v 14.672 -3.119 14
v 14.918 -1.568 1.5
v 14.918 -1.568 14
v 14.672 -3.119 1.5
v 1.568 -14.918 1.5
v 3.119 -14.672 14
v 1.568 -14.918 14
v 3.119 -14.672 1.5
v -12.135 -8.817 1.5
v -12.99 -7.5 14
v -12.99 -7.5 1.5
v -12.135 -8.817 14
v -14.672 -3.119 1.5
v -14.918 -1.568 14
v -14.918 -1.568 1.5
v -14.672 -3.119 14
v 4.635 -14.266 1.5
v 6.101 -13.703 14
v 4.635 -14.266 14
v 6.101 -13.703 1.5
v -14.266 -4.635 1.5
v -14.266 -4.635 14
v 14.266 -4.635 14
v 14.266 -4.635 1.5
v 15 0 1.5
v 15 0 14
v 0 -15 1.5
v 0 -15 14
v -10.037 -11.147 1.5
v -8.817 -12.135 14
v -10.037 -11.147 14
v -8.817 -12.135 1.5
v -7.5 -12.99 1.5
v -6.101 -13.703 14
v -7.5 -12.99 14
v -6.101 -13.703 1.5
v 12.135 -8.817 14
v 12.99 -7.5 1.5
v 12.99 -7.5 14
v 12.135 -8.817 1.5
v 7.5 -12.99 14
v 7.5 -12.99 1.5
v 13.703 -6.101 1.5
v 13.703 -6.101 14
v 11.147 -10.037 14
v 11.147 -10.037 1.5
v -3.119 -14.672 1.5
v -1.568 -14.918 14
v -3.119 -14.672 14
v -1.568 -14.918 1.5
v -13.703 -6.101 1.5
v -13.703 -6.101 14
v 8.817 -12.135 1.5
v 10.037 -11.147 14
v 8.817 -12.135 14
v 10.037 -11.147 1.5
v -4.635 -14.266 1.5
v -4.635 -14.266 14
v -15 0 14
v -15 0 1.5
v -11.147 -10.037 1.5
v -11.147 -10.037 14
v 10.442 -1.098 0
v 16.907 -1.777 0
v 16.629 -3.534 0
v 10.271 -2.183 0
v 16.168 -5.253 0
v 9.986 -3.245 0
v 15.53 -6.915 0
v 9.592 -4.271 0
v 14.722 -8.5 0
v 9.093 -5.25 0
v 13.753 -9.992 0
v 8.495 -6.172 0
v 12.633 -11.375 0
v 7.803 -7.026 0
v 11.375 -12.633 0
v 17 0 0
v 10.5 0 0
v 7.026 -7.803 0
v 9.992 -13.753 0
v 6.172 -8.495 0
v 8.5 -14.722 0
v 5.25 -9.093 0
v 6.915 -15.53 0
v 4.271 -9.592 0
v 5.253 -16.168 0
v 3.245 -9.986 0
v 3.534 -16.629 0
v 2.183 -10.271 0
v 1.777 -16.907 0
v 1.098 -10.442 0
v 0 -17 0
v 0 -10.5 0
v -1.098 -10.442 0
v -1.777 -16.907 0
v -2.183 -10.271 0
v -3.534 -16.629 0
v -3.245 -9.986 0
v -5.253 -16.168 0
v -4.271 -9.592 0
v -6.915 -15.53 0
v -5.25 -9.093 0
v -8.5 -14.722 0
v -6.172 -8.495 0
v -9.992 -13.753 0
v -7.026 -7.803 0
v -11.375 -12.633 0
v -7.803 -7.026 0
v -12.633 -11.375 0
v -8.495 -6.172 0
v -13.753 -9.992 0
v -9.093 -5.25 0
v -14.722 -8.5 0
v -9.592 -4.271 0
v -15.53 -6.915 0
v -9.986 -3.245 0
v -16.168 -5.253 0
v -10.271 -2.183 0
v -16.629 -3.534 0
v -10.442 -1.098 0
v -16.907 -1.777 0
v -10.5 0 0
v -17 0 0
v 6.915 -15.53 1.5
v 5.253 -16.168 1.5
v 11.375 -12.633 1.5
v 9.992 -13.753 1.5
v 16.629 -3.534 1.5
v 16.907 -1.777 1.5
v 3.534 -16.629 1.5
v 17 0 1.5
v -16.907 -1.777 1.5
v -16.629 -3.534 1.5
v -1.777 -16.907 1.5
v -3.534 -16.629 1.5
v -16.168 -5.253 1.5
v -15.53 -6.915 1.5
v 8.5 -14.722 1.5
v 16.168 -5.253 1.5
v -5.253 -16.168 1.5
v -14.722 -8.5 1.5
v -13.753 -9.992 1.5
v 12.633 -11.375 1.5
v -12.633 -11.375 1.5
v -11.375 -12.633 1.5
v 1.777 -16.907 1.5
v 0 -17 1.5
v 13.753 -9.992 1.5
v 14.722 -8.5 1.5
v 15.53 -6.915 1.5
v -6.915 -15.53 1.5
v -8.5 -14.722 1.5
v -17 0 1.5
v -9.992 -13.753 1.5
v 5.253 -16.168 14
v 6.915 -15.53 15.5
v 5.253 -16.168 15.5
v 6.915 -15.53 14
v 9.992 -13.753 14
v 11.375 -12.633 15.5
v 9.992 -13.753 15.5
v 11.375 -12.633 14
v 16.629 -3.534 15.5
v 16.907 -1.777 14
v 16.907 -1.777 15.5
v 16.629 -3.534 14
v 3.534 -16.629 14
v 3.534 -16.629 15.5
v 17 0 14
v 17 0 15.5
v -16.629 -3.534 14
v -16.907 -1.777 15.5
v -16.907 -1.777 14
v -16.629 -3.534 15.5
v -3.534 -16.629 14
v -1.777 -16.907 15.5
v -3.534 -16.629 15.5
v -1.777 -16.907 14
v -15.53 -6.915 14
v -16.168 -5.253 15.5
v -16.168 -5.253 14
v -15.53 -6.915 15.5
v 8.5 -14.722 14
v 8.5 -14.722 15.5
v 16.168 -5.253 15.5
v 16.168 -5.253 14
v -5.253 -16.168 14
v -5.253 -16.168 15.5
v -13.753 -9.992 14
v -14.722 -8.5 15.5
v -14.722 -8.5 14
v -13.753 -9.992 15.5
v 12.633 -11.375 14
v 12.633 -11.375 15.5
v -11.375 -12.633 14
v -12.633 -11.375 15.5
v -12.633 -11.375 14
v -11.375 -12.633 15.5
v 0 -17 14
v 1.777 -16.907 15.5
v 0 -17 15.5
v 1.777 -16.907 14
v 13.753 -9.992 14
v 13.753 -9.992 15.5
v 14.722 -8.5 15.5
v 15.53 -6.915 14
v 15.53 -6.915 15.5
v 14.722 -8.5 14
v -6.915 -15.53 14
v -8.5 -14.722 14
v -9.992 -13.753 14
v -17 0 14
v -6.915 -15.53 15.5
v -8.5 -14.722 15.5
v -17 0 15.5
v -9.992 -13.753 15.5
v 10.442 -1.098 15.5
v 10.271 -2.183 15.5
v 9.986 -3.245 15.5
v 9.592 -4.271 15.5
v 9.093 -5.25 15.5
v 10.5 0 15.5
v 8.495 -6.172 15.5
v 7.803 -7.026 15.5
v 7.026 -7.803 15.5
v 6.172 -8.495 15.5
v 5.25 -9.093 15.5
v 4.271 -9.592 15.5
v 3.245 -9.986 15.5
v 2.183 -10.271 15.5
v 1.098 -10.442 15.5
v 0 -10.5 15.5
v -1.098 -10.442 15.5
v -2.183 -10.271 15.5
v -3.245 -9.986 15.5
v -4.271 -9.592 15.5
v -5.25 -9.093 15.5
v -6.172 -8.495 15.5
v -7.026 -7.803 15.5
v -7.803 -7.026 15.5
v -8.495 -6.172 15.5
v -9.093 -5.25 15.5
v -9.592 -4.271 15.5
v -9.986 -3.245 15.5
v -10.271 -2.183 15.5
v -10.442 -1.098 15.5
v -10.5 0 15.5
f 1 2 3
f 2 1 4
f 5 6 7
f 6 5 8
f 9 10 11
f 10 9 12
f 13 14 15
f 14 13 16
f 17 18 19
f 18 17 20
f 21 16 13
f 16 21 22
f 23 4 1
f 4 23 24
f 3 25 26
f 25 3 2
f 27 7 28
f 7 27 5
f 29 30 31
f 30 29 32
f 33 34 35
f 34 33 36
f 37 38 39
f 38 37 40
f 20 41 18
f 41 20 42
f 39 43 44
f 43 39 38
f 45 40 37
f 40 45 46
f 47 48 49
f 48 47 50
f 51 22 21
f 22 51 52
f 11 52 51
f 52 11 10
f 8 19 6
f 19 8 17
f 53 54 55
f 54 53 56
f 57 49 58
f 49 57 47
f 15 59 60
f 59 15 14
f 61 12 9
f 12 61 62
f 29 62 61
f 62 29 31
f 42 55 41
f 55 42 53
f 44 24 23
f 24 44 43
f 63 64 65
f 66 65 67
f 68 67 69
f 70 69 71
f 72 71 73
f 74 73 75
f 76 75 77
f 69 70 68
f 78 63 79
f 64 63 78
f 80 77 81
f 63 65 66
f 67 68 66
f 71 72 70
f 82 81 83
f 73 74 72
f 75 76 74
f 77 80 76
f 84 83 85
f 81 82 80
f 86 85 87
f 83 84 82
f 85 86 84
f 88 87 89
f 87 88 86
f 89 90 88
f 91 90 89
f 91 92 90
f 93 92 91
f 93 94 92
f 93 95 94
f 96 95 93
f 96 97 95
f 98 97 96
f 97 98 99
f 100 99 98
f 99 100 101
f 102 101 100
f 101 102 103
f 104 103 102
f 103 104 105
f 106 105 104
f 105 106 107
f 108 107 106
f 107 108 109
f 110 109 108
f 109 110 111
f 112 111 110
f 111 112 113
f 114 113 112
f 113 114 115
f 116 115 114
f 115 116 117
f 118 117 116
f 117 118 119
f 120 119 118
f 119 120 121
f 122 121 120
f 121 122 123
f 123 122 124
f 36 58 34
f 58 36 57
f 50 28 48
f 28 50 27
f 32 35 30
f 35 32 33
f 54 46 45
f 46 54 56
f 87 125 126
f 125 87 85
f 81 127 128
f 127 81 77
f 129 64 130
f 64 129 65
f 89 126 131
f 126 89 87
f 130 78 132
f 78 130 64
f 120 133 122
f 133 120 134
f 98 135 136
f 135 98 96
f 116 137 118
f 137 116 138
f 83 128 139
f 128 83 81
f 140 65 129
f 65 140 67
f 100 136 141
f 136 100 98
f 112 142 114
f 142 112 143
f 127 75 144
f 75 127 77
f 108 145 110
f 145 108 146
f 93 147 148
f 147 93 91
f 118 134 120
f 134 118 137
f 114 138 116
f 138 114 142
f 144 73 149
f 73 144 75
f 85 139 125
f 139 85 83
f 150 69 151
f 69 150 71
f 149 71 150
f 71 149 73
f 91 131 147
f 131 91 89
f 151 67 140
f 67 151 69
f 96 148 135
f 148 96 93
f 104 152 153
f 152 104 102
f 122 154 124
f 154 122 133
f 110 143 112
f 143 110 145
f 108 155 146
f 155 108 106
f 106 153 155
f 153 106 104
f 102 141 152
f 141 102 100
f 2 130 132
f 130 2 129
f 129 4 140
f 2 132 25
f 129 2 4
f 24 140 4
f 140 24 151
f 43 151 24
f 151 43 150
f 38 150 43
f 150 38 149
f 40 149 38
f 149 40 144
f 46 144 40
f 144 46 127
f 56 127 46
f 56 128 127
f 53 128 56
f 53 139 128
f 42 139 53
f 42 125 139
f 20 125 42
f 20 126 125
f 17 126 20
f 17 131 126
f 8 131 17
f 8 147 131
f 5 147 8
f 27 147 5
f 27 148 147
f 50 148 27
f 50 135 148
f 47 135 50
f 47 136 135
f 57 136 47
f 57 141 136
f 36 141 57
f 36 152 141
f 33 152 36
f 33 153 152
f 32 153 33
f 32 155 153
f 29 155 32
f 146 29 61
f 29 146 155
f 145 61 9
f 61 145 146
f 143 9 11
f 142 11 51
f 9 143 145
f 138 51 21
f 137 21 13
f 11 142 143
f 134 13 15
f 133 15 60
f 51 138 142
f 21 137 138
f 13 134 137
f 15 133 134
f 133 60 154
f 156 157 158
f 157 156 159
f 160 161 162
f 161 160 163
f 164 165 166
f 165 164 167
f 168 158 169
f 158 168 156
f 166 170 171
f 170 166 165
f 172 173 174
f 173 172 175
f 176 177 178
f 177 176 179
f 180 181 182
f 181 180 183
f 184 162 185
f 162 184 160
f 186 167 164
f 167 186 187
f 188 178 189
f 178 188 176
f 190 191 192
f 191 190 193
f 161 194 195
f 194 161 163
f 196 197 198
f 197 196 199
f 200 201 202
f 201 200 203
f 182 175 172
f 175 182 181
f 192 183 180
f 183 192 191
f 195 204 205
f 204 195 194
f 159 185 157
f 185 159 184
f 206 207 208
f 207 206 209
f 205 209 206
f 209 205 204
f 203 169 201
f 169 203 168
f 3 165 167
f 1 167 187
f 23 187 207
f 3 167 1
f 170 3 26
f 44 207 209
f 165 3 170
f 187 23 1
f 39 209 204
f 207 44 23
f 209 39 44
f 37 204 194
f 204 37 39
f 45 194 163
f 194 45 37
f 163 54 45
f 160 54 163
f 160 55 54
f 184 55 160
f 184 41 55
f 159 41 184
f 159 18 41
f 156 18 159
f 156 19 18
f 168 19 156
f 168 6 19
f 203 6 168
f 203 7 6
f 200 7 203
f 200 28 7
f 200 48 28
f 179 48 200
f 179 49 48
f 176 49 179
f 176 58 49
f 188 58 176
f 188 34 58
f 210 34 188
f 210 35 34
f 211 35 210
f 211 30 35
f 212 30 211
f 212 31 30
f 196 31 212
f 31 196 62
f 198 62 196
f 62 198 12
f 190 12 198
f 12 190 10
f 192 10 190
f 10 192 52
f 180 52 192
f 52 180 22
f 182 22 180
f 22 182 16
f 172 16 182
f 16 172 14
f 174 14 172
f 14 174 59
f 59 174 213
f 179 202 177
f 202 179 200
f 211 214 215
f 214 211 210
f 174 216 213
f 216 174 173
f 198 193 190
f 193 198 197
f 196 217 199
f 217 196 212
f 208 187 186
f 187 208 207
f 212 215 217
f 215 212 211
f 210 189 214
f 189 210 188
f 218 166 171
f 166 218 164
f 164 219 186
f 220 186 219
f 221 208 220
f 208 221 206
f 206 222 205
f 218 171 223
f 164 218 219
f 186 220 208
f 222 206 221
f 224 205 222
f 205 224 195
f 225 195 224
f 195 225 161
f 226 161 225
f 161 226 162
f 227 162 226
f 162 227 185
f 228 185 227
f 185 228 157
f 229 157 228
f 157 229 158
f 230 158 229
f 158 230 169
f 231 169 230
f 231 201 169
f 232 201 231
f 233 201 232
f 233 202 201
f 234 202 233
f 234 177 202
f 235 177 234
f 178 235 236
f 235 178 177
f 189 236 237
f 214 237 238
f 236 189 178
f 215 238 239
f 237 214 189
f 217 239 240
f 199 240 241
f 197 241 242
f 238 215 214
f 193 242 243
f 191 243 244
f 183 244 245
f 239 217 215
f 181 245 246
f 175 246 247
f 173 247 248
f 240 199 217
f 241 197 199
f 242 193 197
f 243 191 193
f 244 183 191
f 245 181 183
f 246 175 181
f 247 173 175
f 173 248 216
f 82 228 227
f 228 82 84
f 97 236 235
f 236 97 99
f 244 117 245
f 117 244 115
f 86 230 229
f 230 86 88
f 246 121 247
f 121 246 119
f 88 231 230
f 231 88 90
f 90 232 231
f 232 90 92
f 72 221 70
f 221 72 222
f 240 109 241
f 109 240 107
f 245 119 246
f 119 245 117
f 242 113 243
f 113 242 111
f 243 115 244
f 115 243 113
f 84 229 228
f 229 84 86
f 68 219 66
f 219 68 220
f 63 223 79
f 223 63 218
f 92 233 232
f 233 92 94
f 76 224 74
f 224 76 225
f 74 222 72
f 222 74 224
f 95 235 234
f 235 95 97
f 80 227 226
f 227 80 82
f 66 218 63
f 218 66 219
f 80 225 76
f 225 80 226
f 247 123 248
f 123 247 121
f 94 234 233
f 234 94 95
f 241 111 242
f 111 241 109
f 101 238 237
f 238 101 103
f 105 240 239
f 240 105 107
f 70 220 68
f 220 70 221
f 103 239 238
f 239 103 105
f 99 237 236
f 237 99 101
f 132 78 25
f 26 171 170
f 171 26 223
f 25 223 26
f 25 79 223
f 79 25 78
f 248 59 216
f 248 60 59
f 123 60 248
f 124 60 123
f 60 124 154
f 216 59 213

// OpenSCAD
$fn=60;
difference() {
    union() {
        cylinder(d=30,h=15);
        cylinder(d=34,h=1.5);
        translate([0,0,14]) cylinder(d=34,h=1.5);
    }
    translate([0,0,-1]) cylinder(d=21,h=20);
    translate([-25,0,-1]) cube([50,50,50]);
}
